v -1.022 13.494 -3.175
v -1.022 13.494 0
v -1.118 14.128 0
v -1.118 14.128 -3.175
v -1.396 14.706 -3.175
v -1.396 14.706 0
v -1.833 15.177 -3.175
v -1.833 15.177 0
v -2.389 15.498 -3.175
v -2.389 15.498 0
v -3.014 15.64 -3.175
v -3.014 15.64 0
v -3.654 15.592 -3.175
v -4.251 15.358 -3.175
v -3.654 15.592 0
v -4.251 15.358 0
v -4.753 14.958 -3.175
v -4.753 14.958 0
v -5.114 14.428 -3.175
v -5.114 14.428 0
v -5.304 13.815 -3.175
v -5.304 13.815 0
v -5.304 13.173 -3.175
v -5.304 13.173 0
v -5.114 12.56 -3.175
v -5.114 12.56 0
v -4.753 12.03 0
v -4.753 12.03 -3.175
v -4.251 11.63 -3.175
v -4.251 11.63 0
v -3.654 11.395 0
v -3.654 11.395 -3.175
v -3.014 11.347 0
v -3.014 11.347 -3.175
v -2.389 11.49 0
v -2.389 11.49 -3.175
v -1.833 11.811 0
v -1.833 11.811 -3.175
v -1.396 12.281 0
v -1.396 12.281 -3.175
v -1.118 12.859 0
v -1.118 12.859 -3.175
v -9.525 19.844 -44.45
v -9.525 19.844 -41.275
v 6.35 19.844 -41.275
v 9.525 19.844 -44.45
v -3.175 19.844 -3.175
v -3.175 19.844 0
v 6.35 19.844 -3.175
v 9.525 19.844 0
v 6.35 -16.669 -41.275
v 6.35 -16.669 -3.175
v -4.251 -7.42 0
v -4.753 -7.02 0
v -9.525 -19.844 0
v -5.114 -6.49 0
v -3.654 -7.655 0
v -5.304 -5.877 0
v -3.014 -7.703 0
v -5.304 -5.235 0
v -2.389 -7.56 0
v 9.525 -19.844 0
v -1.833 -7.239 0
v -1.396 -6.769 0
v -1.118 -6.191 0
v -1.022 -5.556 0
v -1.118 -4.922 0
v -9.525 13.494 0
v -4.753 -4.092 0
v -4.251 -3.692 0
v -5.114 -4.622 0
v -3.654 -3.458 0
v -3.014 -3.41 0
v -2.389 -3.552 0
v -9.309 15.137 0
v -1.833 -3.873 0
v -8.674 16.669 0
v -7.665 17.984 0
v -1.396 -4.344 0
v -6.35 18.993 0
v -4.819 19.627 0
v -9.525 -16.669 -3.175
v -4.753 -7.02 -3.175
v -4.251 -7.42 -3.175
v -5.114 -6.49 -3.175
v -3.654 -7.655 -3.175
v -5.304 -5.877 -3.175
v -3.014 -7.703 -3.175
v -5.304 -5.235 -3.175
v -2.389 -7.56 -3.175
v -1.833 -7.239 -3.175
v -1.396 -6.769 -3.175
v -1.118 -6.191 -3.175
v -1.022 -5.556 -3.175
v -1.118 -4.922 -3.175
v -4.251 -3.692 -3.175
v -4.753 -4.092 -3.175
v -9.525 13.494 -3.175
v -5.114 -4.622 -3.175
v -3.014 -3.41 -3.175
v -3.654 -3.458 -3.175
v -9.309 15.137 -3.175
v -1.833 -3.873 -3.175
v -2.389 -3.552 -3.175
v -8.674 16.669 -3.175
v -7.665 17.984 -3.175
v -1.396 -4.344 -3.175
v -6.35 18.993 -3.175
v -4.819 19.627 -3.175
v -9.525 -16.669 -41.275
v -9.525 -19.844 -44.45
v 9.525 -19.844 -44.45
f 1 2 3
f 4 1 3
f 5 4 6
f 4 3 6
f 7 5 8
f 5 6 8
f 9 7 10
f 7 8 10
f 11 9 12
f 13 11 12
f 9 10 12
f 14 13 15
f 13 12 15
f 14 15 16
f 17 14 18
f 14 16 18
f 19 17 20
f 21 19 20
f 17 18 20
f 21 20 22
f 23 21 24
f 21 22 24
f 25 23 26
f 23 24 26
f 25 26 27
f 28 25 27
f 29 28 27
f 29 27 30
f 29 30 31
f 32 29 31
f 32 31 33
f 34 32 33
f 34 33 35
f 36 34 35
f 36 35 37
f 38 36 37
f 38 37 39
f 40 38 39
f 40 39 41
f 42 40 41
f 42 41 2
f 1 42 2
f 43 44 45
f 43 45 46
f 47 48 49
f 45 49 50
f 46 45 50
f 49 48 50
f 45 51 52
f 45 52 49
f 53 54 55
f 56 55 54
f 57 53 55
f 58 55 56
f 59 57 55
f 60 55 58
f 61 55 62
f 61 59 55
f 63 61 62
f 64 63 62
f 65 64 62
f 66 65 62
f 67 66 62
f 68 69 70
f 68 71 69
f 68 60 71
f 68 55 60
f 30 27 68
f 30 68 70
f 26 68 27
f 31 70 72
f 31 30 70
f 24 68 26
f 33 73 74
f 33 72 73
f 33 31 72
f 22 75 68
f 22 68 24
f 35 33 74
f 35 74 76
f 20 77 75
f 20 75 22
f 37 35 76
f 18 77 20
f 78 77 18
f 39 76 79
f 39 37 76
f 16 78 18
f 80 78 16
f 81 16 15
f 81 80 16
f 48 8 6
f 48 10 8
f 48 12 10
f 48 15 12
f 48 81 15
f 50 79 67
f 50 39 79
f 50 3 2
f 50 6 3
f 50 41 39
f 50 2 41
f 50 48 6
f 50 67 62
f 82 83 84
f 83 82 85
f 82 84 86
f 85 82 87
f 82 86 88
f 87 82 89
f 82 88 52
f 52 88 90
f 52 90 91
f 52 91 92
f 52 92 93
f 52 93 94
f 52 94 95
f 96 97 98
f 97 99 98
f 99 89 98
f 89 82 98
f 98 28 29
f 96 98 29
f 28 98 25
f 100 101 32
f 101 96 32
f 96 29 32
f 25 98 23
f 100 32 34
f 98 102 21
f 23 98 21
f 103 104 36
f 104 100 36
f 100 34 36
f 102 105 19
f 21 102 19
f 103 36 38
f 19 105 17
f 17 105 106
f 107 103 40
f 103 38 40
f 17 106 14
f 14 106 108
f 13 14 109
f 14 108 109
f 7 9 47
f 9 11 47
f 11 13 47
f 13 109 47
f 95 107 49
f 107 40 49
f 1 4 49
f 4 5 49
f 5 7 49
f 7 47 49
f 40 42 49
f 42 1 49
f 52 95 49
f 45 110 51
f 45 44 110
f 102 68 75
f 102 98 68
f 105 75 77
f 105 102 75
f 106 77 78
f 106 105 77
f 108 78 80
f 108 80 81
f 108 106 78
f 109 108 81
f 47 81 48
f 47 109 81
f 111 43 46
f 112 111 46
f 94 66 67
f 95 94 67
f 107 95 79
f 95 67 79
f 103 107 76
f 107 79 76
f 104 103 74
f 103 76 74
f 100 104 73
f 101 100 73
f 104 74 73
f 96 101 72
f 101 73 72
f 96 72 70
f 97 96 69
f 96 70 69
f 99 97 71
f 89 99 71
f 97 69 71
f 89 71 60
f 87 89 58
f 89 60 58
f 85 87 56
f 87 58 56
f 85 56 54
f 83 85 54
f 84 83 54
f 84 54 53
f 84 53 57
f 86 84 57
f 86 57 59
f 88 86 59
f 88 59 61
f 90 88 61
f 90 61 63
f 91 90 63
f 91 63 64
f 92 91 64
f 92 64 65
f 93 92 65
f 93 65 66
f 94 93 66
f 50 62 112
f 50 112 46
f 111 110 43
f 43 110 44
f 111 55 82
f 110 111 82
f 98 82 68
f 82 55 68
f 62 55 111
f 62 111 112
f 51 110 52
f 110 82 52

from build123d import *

# Parameters (mm, degrees)
SKETCH1_W           = 19.05
SKETCH1_H           = 39.6875
BOSS_EXTRUDE1_DEPTH = 44.45
SHELL1_T            = -3.175
CUT_EXTRUDE1_REACH  = 51.601
SKETCH2_R           = 2.15265
FILLET2_R           = 6.35


with BuildPart() as part:
    # Sketch1 → Boss-Extrude1 (new body)
    with BuildSketch(Plane.XY):
        Rectangle(SKETCH1_W, SKETCH1_H)
    extrude(amount=-BOSS_EXTRUDE1_DEPTH)

    # Shell1
    shell1_openings = [part.faces().sort_by_distance(p)[0] for p in [
        (-9.525, 0, -22.225),
        (0, 19.84375, -22.225),
    ]]
    offset(amount=SHELL1_T, openings=shell1_openings, kind=Kind.INTERSECTION)

    # Sketch2 → Cut-Extrude1 (cut, up to next)
    with BuildSketch(Plane.XY, mode=Mode.PRIVATE) as cut_extrude1_sk1:
        with Locations((-3.175, -5.55625)):
            Circle(SKETCH2_R)
    cut_extrude1_tool1 = extrude(cut_extrude1_sk1.sketch, amount=-CUT_EXTRUDE1_REACH, mode=Mode.PRIVATE) & part.part
    # Sketch2 → Cut-Extrude1 (cut, up to next)
    with BuildSketch(Plane.XY, mode=Mode.PRIVATE) as cut_extrude1_sk2:
        with Locations((-3.175, 13.49375)):
            Circle(SKETCH2_R)
    cut_extrude1_tool2 = extrude(cut_extrude1_sk2.sketch, amount=-CUT_EXTRUDE1_REACH, mode=Mode.PRIVATE) & part.part
    add(cut_extrude1_tool1.solids().sort_by_distance((-3.175, -5.55625, 0))[0], mode=Mode.SUBTRACT)
    add(cut_extrude1_tool2.solids().sort_by_distance((-3.175, 13.49375, 0))[0], mode=Mode.SUBTRACT)

    # Fillet2
    fillet2_edges = [part.edges().sort_by_distance(p)[0] for p in [
        (-9.525, 19.84375, -1.5875),
    ]]
    fillet(fillet2_edges, radius=FILLET2_R)


solid = part.part
